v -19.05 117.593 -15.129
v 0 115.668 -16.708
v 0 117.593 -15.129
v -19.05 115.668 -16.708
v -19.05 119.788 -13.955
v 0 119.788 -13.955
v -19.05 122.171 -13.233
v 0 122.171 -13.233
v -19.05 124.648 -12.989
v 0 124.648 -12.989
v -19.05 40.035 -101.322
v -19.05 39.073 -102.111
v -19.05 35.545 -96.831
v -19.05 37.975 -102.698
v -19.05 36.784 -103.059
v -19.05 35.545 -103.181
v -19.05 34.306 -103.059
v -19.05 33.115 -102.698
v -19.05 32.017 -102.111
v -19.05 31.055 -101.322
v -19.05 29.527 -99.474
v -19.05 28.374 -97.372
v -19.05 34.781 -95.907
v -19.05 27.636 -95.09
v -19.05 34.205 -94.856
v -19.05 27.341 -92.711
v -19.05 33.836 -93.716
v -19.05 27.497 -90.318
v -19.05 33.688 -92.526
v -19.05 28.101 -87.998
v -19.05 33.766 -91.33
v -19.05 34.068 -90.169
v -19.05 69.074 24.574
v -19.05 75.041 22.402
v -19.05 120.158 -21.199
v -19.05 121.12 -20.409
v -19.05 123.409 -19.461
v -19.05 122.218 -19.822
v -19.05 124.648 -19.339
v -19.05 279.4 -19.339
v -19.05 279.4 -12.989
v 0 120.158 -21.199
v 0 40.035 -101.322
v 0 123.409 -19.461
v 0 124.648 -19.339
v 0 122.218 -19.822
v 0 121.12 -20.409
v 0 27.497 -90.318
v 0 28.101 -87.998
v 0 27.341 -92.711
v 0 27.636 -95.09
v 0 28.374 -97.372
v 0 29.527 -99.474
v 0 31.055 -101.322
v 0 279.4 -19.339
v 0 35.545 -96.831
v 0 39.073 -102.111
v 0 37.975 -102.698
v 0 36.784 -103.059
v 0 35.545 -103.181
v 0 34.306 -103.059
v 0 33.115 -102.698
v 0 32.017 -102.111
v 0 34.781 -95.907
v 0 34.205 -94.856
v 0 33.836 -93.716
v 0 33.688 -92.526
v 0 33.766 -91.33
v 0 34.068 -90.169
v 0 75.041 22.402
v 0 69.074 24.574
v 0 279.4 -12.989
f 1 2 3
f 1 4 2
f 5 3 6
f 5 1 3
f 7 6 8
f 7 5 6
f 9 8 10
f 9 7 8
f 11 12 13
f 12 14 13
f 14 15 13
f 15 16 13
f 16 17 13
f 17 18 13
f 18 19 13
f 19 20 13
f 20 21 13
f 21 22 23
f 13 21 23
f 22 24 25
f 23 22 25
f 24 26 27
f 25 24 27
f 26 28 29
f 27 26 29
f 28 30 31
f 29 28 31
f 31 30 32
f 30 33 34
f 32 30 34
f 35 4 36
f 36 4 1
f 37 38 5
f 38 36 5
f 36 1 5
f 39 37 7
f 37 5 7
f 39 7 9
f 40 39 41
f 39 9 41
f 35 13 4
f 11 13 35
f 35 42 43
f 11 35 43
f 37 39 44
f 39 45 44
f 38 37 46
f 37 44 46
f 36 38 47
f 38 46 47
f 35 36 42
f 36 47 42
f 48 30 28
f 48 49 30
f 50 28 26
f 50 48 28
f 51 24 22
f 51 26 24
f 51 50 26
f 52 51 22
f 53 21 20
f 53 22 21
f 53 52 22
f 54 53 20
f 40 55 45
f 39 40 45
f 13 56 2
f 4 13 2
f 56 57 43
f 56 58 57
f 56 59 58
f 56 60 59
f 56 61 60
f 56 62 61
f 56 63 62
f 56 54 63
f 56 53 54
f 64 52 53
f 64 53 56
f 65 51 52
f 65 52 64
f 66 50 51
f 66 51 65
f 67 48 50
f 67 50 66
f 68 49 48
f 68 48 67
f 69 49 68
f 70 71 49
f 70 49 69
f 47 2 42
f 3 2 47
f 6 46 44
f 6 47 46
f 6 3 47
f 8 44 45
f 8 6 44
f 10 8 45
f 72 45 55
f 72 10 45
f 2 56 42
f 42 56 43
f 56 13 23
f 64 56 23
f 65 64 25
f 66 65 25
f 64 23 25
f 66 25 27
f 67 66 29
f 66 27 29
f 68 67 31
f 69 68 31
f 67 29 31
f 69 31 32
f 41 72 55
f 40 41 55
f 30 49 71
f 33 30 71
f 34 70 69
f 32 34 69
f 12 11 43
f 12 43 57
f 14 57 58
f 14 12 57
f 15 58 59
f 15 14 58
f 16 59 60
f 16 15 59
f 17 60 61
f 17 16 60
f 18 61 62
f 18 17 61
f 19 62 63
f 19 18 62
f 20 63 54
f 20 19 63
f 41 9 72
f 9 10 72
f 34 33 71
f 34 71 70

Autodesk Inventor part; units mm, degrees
ref_plane "YZ Plane" through (0, 0, 0) normal (1, 0, 0) x (0, 1, 0)
ref_plane "XZ Plane" through (0, 0, 0) normal (0, 1, 0) x (-1, 0, 0)
ref_plane "XY Plane" through (0, 0, 0) normal (0, 0, 1) x (1, 0, 0)
sketch "Sketch1" plane through (0, 0, 0) normal (1, 0, 0) x (0, 1, 0)
  line L0 (6.35, -12.9887) -> (279.4, -12.9887)
  line L1 (279.4, -12.9887) -> (279.4, -19.3387)
  line L2 (279.4, -19.3387) -> (0, -19.3387)
  line L3 (0, -19.3387) -> (0, -12.9887)
  line L4 (0, -12.9887) -> (0, 114.0113)
  line L5 (0, 114.0113) -> (6.35, 114.0113)
  line L6 (6.35, 114.0113) -> (6.35, -12.9887)
  point P0 (0, 0)
  dimension "d0" = 279.4
  dimension "d1" = 6.35
  dimension "d2" = 127
  dimension "d3" = 6.35
extrude "Extrusion1" add sketch "Sketch1" against normal blind 19.05
sketch "Sketch2" plane through (0, 6.35, 114.0113) normal (0, 1, 0) x (1, 0, 0)
  line L0 (0, 127) -> (-19.05, 127) projected
  line L1 (-19.05, 127) -> (0, 127)
  line L2 (0, 0) -> (0, 133.35) projected
  point P0 (0, 114.0113)
fillet "Fillet1" radius 6.35 1 edges at (-9.525, 0, -19.3387)
bend part "Bend Part1" radius 6.35 angle 65 line through (-19.05, 6.35, -12.9887) along (1, 0, 0) centre toward (0, 1, 0) moving side (0, 0, 1) both sides no
sketch "Sketch3" plane through (0, 6.35, -19.3387) normal (0, 0, -1) x (-1, 0, 0)
  line L0 (39.6982, 130.9983) -> (-135.4768, 130.9983) projected
  line L1 (19.05, 118.2983) -> (0, 118.2983)
  point P0 (0, -6.35)
bend part "Bend Part2" radius 6.35 angle 45 line through (-19.05, 124.6483, -19.3387) along (1, 0, 0) centre toward (0, 0, -1) moving side (0, -1, 0) both sides no
properties part number "Plexi hooks"
